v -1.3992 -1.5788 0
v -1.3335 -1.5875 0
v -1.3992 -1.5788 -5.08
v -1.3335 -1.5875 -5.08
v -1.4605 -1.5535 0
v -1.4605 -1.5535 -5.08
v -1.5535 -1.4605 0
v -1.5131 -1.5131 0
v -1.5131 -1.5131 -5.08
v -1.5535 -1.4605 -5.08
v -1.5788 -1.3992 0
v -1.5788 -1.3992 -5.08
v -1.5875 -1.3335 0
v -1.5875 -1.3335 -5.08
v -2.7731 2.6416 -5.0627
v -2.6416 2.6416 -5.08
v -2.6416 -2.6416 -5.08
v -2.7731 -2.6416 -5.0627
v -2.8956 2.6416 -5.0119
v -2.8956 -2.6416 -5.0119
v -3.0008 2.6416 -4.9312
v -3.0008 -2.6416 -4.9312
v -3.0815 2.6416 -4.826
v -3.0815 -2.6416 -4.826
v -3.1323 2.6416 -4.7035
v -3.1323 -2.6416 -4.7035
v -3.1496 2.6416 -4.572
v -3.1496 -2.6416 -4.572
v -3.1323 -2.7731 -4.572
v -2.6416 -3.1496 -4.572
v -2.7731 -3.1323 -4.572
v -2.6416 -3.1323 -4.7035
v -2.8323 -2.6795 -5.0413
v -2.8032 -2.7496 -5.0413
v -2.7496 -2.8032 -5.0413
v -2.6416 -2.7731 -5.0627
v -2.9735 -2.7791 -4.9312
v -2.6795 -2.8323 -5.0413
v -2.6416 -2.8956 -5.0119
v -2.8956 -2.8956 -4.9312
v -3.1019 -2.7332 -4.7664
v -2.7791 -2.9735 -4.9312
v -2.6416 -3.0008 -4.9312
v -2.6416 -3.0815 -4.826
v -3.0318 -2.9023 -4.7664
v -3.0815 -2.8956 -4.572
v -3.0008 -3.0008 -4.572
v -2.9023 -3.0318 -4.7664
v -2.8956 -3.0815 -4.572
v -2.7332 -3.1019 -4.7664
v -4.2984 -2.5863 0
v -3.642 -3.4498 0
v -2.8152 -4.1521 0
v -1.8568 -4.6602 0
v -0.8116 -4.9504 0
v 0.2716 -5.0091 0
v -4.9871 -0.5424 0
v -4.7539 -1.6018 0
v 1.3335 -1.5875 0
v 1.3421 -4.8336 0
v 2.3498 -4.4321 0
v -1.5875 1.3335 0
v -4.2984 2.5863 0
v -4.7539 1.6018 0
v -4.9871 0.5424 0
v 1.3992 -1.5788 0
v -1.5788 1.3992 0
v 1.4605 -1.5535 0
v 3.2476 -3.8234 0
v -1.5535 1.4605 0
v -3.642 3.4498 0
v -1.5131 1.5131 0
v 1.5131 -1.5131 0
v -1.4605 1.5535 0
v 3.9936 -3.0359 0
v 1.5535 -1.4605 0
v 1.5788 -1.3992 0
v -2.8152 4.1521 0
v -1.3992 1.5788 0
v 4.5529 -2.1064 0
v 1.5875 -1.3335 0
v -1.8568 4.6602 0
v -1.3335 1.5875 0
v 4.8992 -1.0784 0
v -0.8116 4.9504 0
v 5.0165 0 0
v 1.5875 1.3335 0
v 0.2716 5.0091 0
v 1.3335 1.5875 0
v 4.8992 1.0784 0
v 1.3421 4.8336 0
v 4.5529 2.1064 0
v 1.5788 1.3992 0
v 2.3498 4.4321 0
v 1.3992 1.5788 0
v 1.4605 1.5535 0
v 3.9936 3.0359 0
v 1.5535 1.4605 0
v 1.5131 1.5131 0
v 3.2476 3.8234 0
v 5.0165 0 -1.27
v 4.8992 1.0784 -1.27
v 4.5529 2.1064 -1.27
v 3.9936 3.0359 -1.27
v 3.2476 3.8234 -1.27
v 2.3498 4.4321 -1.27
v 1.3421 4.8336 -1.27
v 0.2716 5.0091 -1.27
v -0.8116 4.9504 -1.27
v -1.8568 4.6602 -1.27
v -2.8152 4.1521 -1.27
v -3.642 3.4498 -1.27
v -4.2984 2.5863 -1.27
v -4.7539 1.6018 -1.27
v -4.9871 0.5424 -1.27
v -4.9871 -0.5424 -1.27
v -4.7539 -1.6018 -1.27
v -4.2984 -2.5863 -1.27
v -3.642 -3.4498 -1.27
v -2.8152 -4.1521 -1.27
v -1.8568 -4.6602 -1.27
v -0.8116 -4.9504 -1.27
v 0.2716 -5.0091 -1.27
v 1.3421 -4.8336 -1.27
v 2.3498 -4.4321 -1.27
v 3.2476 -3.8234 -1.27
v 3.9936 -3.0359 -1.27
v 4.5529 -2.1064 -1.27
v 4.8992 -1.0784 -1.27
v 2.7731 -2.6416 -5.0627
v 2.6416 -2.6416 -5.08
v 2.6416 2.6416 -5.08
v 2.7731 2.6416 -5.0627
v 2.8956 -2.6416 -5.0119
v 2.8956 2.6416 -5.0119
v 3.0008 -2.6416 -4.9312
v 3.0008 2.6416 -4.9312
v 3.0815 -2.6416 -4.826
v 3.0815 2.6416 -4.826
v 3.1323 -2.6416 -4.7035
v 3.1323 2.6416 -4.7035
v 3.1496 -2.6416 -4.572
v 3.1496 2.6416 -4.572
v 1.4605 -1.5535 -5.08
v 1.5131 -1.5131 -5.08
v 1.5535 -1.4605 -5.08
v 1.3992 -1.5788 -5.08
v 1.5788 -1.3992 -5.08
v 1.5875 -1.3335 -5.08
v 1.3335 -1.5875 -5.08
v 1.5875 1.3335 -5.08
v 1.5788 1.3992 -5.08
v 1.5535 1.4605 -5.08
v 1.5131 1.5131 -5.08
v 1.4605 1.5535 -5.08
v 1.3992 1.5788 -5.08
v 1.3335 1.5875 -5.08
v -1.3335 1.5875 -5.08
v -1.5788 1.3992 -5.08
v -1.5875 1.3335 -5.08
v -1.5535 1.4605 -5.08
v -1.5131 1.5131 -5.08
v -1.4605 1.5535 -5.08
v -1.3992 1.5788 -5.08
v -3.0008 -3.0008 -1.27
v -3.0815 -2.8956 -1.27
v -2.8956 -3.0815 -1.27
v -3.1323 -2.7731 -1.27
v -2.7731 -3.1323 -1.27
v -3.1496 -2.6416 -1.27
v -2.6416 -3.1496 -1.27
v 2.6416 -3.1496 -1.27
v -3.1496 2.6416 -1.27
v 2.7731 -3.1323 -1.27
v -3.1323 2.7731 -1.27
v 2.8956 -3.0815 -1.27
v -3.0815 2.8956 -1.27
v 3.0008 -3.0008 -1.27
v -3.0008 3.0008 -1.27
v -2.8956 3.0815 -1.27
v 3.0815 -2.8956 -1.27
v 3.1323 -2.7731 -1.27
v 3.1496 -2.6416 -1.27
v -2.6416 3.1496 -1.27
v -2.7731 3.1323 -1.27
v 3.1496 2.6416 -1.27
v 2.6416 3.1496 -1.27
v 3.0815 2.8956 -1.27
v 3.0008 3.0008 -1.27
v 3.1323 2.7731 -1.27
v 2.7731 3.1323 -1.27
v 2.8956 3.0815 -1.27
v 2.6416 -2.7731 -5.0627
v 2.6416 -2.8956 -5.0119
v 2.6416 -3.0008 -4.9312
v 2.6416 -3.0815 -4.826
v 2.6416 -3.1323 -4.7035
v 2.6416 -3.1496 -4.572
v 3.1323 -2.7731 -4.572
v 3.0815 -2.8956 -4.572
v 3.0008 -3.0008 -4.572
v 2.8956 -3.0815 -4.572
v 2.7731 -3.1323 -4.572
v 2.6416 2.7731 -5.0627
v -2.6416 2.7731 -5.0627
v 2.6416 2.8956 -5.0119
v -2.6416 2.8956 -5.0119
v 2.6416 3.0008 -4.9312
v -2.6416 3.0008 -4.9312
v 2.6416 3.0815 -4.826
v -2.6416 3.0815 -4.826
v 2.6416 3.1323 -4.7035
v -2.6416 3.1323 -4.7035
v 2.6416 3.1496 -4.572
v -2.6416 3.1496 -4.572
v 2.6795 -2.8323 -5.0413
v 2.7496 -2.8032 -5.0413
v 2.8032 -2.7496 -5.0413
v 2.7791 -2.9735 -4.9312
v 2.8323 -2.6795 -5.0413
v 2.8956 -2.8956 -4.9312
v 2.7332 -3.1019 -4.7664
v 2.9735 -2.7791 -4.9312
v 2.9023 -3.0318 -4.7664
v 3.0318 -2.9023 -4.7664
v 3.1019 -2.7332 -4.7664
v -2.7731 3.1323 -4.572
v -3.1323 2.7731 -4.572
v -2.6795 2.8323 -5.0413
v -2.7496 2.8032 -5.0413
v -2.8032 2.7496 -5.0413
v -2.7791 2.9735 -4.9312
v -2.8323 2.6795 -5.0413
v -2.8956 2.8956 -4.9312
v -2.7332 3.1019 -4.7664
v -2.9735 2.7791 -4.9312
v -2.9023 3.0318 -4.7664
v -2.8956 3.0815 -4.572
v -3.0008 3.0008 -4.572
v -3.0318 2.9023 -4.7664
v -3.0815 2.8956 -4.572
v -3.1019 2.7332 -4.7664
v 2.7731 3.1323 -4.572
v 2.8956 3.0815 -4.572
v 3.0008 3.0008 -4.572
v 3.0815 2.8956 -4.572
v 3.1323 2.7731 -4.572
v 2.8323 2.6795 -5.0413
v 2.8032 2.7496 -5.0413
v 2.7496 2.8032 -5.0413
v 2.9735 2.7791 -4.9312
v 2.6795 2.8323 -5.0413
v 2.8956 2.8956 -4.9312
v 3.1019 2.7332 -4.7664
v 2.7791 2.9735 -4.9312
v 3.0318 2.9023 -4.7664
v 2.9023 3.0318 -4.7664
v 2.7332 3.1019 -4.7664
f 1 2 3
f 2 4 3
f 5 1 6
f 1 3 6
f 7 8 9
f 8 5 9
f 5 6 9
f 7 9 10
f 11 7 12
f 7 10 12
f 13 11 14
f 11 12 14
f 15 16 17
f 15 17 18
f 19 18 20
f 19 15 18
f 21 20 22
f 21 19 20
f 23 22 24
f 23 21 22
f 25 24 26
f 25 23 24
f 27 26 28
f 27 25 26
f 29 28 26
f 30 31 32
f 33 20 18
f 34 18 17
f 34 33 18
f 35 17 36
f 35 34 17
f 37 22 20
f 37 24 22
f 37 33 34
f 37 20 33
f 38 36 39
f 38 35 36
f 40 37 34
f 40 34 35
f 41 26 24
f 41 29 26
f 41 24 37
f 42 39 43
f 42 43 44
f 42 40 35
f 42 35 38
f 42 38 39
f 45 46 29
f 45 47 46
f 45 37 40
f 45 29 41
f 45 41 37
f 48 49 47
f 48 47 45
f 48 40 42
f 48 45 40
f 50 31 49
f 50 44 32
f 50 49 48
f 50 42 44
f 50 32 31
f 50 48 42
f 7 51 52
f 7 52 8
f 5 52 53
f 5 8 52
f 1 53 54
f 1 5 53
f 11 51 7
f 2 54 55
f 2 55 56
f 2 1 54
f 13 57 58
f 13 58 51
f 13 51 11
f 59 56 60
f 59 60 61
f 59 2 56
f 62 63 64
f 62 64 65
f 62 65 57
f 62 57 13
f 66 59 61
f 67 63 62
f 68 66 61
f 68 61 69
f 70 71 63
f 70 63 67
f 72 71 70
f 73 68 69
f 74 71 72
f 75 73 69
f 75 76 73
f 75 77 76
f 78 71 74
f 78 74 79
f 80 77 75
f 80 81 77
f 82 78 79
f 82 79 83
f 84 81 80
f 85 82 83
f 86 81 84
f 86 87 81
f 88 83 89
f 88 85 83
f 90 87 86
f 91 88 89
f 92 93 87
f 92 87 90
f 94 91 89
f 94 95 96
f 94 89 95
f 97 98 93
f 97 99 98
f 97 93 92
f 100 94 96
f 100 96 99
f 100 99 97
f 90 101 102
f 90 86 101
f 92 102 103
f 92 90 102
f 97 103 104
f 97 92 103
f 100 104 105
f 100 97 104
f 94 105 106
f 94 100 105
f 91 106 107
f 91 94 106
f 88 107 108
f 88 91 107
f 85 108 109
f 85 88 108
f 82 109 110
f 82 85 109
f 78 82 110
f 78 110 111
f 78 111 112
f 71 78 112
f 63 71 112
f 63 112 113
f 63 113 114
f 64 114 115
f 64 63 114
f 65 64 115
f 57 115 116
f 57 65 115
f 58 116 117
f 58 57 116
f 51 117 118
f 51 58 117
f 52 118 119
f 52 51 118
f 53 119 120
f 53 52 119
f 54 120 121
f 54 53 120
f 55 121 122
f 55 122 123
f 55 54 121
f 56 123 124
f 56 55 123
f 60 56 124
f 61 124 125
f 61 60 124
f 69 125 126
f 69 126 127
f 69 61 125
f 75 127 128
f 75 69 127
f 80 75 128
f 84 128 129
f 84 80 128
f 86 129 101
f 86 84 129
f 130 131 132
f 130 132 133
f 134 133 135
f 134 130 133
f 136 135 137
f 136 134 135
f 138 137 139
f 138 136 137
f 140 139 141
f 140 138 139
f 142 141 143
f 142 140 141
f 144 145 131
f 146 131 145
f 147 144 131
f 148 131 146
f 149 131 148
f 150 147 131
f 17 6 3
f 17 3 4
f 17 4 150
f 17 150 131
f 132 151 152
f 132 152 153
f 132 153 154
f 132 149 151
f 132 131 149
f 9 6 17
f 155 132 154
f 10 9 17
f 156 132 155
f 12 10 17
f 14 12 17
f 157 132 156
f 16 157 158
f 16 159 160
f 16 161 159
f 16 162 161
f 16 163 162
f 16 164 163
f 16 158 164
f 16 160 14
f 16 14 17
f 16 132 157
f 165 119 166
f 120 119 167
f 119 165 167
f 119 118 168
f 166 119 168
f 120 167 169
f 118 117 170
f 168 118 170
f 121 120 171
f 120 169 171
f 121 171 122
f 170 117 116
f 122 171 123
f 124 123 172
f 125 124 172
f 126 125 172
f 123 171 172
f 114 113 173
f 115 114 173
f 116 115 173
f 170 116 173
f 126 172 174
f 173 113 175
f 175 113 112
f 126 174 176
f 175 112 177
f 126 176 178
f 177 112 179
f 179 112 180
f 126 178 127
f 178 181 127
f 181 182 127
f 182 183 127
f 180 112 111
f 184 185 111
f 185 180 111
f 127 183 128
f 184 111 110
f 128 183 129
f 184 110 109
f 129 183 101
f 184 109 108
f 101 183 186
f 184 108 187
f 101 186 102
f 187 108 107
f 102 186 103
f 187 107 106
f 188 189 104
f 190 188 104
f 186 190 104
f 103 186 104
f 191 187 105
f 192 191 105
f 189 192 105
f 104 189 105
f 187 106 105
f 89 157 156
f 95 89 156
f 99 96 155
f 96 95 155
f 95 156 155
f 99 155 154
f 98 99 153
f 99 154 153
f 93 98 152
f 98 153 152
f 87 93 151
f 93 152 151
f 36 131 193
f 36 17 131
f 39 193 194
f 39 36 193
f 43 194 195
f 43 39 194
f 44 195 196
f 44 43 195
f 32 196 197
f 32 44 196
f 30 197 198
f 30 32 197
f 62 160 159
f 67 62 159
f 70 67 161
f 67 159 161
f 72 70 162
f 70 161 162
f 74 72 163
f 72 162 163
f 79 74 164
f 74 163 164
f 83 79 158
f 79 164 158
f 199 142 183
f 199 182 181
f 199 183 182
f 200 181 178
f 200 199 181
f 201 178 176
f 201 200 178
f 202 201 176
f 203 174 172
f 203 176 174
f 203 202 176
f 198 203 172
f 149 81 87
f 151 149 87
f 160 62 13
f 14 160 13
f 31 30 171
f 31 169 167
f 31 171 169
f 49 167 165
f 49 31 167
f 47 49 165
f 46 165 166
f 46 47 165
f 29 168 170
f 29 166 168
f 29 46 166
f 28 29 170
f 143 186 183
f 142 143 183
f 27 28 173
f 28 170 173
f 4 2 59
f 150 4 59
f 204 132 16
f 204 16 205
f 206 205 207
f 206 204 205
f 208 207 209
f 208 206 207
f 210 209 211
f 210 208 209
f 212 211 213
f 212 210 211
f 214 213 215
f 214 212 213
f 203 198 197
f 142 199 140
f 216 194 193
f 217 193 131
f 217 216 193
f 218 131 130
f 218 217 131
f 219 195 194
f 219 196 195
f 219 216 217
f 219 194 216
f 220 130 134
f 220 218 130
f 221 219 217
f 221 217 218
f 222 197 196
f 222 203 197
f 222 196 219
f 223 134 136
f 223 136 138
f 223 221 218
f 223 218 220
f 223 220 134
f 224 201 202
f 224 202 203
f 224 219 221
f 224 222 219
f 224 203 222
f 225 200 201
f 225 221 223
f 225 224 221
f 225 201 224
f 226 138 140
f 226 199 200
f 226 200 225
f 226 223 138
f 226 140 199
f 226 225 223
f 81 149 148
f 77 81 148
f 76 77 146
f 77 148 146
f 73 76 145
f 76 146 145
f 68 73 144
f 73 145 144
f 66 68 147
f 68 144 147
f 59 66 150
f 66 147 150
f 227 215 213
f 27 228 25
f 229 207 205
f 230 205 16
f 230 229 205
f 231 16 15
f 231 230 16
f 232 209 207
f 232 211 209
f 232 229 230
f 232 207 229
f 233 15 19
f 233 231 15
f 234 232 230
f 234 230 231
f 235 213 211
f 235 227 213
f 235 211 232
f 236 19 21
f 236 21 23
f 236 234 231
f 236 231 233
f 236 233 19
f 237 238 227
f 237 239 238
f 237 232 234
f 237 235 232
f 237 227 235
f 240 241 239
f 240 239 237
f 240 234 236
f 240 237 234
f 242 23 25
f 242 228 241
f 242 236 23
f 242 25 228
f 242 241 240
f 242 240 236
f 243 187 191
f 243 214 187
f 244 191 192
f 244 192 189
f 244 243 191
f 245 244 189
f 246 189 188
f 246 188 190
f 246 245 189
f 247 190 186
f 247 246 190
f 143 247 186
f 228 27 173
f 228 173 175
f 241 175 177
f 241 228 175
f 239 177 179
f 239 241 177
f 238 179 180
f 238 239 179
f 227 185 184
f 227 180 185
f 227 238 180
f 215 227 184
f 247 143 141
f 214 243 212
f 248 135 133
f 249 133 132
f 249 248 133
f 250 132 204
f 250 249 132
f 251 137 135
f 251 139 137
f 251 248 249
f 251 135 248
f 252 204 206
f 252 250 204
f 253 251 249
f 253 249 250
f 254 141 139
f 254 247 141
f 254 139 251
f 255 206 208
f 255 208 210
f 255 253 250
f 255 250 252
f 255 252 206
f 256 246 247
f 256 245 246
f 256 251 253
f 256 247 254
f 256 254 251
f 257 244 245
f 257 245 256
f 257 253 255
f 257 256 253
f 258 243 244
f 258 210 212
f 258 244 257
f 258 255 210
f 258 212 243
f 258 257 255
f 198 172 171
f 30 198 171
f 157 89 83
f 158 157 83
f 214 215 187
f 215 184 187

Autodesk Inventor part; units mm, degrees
ref_plane "YZ Plane" through (0, 0, 0) normal (1, 0, 0) x (0, 1, 0)
ref_plane "XZ Plane" through (0, 0, 0) normal (0, 1, 0) x (-1, 0, 0)
ref_plane "XY Plane" through (0, 0, 0) normal (0, 0, 1) x (1, 0, 0)
sketch "Sketch1" plane through (0, 0, 0) normal (0, 0, 1) x (1, 0, 0)
  circle A0 centre (0, 0) radius 5.0165
  dimension "d0" = 10.033
extrude "Extrusion1" add sketch "Sketch1" against normal blind 1.27
sketch "Sketch2" plane through (0, 0, -1.27) normal (0, 0, -1) x (-1, 0, 0)
  circle A0 centre (0, 0) radius 5.0165 projected
  line L0 (-3.1496, -3.1496) -> (3.1496, -3.1496)
  line L1 (3.1496, -3.1496) -> (3.1496, 3.1496)
  line L2 (3.1496, 3.1496) -> (-3.1496, 3.1496)
  line L3 (-3.1496, 3.1496) -> (-3.1496, -3.1496)
  point P0 (0, 3.1496)
  point P1 (-3.1496, 0)
  dimension "d3" = 6.2992
extrude "Extrusion2" add sketch "Sketch2" along normal blind 3.81 contours L3 L2 L1 L0
fillet "Fillet1" radius 0.508 8 edges at (3.1496, 3.1496, -3.175) (-3.1496, 3.1496, -3.175) (-3.1496, -3.1496, -3.175) (3.1496, -3.1496, -3.175) (3.1496, 0, -5.08) (0, 3.1496, -5.08) (-3.1496, 0, -5.08) (0, -3.1496, -5.08)
sketch "Sketch4" plane through (0, 0, 0) normal (0, 0, 1) x (1, 0, 0)
  circle A0 centre (0, 0) radius 5.0165 projected
  line L0 (-1.5875, -1.5875) -> (1.5875, -1.5875)
  line L1 (1.5875, -1.5875) -> (1.5875, 1.5875)
  line L2 (1.5875, 1.5875) -> (-1.5875, 1.5875)
  line L3 (-1.5875, 1.5875) -> (-1.5875, -1.5875)
  point P0 (0, 1.5875)
  point P1 (-1.5875, 0)
  dimension "d14" = 3.175
extrude "Extrusion3" cut sketch "Sketch4" against normal through all contours L3 L2 L1 L0
fillet "Fillet2" radius 0.254 4 edges at (-1.5875, 1.5875, -2.54) (1.5875, 1.5875, -2.54) (-1.5875, -1.5875, -2.54) (1.5875, -1.5875, -2.54)
sketch "Sketch5" plane through (0, 0, 0) normal (0, 0, 1) x (1, 0, 0)
  line L0 (-1.3335, 1.5875) -> (1.3335, 1.5875) projected
  circle A0 centre (0, 0) radius 5.0165 projected
  circle A1 centre (0, 0) radius 1.5875
surface extrude "ExtrusionSrf1" sketch "Sketch5" against normal up to surface (5.08 mm away) shown no curves A1
properties part number "High Strength Square Gear Insert" material "Acetal Resin, White"
